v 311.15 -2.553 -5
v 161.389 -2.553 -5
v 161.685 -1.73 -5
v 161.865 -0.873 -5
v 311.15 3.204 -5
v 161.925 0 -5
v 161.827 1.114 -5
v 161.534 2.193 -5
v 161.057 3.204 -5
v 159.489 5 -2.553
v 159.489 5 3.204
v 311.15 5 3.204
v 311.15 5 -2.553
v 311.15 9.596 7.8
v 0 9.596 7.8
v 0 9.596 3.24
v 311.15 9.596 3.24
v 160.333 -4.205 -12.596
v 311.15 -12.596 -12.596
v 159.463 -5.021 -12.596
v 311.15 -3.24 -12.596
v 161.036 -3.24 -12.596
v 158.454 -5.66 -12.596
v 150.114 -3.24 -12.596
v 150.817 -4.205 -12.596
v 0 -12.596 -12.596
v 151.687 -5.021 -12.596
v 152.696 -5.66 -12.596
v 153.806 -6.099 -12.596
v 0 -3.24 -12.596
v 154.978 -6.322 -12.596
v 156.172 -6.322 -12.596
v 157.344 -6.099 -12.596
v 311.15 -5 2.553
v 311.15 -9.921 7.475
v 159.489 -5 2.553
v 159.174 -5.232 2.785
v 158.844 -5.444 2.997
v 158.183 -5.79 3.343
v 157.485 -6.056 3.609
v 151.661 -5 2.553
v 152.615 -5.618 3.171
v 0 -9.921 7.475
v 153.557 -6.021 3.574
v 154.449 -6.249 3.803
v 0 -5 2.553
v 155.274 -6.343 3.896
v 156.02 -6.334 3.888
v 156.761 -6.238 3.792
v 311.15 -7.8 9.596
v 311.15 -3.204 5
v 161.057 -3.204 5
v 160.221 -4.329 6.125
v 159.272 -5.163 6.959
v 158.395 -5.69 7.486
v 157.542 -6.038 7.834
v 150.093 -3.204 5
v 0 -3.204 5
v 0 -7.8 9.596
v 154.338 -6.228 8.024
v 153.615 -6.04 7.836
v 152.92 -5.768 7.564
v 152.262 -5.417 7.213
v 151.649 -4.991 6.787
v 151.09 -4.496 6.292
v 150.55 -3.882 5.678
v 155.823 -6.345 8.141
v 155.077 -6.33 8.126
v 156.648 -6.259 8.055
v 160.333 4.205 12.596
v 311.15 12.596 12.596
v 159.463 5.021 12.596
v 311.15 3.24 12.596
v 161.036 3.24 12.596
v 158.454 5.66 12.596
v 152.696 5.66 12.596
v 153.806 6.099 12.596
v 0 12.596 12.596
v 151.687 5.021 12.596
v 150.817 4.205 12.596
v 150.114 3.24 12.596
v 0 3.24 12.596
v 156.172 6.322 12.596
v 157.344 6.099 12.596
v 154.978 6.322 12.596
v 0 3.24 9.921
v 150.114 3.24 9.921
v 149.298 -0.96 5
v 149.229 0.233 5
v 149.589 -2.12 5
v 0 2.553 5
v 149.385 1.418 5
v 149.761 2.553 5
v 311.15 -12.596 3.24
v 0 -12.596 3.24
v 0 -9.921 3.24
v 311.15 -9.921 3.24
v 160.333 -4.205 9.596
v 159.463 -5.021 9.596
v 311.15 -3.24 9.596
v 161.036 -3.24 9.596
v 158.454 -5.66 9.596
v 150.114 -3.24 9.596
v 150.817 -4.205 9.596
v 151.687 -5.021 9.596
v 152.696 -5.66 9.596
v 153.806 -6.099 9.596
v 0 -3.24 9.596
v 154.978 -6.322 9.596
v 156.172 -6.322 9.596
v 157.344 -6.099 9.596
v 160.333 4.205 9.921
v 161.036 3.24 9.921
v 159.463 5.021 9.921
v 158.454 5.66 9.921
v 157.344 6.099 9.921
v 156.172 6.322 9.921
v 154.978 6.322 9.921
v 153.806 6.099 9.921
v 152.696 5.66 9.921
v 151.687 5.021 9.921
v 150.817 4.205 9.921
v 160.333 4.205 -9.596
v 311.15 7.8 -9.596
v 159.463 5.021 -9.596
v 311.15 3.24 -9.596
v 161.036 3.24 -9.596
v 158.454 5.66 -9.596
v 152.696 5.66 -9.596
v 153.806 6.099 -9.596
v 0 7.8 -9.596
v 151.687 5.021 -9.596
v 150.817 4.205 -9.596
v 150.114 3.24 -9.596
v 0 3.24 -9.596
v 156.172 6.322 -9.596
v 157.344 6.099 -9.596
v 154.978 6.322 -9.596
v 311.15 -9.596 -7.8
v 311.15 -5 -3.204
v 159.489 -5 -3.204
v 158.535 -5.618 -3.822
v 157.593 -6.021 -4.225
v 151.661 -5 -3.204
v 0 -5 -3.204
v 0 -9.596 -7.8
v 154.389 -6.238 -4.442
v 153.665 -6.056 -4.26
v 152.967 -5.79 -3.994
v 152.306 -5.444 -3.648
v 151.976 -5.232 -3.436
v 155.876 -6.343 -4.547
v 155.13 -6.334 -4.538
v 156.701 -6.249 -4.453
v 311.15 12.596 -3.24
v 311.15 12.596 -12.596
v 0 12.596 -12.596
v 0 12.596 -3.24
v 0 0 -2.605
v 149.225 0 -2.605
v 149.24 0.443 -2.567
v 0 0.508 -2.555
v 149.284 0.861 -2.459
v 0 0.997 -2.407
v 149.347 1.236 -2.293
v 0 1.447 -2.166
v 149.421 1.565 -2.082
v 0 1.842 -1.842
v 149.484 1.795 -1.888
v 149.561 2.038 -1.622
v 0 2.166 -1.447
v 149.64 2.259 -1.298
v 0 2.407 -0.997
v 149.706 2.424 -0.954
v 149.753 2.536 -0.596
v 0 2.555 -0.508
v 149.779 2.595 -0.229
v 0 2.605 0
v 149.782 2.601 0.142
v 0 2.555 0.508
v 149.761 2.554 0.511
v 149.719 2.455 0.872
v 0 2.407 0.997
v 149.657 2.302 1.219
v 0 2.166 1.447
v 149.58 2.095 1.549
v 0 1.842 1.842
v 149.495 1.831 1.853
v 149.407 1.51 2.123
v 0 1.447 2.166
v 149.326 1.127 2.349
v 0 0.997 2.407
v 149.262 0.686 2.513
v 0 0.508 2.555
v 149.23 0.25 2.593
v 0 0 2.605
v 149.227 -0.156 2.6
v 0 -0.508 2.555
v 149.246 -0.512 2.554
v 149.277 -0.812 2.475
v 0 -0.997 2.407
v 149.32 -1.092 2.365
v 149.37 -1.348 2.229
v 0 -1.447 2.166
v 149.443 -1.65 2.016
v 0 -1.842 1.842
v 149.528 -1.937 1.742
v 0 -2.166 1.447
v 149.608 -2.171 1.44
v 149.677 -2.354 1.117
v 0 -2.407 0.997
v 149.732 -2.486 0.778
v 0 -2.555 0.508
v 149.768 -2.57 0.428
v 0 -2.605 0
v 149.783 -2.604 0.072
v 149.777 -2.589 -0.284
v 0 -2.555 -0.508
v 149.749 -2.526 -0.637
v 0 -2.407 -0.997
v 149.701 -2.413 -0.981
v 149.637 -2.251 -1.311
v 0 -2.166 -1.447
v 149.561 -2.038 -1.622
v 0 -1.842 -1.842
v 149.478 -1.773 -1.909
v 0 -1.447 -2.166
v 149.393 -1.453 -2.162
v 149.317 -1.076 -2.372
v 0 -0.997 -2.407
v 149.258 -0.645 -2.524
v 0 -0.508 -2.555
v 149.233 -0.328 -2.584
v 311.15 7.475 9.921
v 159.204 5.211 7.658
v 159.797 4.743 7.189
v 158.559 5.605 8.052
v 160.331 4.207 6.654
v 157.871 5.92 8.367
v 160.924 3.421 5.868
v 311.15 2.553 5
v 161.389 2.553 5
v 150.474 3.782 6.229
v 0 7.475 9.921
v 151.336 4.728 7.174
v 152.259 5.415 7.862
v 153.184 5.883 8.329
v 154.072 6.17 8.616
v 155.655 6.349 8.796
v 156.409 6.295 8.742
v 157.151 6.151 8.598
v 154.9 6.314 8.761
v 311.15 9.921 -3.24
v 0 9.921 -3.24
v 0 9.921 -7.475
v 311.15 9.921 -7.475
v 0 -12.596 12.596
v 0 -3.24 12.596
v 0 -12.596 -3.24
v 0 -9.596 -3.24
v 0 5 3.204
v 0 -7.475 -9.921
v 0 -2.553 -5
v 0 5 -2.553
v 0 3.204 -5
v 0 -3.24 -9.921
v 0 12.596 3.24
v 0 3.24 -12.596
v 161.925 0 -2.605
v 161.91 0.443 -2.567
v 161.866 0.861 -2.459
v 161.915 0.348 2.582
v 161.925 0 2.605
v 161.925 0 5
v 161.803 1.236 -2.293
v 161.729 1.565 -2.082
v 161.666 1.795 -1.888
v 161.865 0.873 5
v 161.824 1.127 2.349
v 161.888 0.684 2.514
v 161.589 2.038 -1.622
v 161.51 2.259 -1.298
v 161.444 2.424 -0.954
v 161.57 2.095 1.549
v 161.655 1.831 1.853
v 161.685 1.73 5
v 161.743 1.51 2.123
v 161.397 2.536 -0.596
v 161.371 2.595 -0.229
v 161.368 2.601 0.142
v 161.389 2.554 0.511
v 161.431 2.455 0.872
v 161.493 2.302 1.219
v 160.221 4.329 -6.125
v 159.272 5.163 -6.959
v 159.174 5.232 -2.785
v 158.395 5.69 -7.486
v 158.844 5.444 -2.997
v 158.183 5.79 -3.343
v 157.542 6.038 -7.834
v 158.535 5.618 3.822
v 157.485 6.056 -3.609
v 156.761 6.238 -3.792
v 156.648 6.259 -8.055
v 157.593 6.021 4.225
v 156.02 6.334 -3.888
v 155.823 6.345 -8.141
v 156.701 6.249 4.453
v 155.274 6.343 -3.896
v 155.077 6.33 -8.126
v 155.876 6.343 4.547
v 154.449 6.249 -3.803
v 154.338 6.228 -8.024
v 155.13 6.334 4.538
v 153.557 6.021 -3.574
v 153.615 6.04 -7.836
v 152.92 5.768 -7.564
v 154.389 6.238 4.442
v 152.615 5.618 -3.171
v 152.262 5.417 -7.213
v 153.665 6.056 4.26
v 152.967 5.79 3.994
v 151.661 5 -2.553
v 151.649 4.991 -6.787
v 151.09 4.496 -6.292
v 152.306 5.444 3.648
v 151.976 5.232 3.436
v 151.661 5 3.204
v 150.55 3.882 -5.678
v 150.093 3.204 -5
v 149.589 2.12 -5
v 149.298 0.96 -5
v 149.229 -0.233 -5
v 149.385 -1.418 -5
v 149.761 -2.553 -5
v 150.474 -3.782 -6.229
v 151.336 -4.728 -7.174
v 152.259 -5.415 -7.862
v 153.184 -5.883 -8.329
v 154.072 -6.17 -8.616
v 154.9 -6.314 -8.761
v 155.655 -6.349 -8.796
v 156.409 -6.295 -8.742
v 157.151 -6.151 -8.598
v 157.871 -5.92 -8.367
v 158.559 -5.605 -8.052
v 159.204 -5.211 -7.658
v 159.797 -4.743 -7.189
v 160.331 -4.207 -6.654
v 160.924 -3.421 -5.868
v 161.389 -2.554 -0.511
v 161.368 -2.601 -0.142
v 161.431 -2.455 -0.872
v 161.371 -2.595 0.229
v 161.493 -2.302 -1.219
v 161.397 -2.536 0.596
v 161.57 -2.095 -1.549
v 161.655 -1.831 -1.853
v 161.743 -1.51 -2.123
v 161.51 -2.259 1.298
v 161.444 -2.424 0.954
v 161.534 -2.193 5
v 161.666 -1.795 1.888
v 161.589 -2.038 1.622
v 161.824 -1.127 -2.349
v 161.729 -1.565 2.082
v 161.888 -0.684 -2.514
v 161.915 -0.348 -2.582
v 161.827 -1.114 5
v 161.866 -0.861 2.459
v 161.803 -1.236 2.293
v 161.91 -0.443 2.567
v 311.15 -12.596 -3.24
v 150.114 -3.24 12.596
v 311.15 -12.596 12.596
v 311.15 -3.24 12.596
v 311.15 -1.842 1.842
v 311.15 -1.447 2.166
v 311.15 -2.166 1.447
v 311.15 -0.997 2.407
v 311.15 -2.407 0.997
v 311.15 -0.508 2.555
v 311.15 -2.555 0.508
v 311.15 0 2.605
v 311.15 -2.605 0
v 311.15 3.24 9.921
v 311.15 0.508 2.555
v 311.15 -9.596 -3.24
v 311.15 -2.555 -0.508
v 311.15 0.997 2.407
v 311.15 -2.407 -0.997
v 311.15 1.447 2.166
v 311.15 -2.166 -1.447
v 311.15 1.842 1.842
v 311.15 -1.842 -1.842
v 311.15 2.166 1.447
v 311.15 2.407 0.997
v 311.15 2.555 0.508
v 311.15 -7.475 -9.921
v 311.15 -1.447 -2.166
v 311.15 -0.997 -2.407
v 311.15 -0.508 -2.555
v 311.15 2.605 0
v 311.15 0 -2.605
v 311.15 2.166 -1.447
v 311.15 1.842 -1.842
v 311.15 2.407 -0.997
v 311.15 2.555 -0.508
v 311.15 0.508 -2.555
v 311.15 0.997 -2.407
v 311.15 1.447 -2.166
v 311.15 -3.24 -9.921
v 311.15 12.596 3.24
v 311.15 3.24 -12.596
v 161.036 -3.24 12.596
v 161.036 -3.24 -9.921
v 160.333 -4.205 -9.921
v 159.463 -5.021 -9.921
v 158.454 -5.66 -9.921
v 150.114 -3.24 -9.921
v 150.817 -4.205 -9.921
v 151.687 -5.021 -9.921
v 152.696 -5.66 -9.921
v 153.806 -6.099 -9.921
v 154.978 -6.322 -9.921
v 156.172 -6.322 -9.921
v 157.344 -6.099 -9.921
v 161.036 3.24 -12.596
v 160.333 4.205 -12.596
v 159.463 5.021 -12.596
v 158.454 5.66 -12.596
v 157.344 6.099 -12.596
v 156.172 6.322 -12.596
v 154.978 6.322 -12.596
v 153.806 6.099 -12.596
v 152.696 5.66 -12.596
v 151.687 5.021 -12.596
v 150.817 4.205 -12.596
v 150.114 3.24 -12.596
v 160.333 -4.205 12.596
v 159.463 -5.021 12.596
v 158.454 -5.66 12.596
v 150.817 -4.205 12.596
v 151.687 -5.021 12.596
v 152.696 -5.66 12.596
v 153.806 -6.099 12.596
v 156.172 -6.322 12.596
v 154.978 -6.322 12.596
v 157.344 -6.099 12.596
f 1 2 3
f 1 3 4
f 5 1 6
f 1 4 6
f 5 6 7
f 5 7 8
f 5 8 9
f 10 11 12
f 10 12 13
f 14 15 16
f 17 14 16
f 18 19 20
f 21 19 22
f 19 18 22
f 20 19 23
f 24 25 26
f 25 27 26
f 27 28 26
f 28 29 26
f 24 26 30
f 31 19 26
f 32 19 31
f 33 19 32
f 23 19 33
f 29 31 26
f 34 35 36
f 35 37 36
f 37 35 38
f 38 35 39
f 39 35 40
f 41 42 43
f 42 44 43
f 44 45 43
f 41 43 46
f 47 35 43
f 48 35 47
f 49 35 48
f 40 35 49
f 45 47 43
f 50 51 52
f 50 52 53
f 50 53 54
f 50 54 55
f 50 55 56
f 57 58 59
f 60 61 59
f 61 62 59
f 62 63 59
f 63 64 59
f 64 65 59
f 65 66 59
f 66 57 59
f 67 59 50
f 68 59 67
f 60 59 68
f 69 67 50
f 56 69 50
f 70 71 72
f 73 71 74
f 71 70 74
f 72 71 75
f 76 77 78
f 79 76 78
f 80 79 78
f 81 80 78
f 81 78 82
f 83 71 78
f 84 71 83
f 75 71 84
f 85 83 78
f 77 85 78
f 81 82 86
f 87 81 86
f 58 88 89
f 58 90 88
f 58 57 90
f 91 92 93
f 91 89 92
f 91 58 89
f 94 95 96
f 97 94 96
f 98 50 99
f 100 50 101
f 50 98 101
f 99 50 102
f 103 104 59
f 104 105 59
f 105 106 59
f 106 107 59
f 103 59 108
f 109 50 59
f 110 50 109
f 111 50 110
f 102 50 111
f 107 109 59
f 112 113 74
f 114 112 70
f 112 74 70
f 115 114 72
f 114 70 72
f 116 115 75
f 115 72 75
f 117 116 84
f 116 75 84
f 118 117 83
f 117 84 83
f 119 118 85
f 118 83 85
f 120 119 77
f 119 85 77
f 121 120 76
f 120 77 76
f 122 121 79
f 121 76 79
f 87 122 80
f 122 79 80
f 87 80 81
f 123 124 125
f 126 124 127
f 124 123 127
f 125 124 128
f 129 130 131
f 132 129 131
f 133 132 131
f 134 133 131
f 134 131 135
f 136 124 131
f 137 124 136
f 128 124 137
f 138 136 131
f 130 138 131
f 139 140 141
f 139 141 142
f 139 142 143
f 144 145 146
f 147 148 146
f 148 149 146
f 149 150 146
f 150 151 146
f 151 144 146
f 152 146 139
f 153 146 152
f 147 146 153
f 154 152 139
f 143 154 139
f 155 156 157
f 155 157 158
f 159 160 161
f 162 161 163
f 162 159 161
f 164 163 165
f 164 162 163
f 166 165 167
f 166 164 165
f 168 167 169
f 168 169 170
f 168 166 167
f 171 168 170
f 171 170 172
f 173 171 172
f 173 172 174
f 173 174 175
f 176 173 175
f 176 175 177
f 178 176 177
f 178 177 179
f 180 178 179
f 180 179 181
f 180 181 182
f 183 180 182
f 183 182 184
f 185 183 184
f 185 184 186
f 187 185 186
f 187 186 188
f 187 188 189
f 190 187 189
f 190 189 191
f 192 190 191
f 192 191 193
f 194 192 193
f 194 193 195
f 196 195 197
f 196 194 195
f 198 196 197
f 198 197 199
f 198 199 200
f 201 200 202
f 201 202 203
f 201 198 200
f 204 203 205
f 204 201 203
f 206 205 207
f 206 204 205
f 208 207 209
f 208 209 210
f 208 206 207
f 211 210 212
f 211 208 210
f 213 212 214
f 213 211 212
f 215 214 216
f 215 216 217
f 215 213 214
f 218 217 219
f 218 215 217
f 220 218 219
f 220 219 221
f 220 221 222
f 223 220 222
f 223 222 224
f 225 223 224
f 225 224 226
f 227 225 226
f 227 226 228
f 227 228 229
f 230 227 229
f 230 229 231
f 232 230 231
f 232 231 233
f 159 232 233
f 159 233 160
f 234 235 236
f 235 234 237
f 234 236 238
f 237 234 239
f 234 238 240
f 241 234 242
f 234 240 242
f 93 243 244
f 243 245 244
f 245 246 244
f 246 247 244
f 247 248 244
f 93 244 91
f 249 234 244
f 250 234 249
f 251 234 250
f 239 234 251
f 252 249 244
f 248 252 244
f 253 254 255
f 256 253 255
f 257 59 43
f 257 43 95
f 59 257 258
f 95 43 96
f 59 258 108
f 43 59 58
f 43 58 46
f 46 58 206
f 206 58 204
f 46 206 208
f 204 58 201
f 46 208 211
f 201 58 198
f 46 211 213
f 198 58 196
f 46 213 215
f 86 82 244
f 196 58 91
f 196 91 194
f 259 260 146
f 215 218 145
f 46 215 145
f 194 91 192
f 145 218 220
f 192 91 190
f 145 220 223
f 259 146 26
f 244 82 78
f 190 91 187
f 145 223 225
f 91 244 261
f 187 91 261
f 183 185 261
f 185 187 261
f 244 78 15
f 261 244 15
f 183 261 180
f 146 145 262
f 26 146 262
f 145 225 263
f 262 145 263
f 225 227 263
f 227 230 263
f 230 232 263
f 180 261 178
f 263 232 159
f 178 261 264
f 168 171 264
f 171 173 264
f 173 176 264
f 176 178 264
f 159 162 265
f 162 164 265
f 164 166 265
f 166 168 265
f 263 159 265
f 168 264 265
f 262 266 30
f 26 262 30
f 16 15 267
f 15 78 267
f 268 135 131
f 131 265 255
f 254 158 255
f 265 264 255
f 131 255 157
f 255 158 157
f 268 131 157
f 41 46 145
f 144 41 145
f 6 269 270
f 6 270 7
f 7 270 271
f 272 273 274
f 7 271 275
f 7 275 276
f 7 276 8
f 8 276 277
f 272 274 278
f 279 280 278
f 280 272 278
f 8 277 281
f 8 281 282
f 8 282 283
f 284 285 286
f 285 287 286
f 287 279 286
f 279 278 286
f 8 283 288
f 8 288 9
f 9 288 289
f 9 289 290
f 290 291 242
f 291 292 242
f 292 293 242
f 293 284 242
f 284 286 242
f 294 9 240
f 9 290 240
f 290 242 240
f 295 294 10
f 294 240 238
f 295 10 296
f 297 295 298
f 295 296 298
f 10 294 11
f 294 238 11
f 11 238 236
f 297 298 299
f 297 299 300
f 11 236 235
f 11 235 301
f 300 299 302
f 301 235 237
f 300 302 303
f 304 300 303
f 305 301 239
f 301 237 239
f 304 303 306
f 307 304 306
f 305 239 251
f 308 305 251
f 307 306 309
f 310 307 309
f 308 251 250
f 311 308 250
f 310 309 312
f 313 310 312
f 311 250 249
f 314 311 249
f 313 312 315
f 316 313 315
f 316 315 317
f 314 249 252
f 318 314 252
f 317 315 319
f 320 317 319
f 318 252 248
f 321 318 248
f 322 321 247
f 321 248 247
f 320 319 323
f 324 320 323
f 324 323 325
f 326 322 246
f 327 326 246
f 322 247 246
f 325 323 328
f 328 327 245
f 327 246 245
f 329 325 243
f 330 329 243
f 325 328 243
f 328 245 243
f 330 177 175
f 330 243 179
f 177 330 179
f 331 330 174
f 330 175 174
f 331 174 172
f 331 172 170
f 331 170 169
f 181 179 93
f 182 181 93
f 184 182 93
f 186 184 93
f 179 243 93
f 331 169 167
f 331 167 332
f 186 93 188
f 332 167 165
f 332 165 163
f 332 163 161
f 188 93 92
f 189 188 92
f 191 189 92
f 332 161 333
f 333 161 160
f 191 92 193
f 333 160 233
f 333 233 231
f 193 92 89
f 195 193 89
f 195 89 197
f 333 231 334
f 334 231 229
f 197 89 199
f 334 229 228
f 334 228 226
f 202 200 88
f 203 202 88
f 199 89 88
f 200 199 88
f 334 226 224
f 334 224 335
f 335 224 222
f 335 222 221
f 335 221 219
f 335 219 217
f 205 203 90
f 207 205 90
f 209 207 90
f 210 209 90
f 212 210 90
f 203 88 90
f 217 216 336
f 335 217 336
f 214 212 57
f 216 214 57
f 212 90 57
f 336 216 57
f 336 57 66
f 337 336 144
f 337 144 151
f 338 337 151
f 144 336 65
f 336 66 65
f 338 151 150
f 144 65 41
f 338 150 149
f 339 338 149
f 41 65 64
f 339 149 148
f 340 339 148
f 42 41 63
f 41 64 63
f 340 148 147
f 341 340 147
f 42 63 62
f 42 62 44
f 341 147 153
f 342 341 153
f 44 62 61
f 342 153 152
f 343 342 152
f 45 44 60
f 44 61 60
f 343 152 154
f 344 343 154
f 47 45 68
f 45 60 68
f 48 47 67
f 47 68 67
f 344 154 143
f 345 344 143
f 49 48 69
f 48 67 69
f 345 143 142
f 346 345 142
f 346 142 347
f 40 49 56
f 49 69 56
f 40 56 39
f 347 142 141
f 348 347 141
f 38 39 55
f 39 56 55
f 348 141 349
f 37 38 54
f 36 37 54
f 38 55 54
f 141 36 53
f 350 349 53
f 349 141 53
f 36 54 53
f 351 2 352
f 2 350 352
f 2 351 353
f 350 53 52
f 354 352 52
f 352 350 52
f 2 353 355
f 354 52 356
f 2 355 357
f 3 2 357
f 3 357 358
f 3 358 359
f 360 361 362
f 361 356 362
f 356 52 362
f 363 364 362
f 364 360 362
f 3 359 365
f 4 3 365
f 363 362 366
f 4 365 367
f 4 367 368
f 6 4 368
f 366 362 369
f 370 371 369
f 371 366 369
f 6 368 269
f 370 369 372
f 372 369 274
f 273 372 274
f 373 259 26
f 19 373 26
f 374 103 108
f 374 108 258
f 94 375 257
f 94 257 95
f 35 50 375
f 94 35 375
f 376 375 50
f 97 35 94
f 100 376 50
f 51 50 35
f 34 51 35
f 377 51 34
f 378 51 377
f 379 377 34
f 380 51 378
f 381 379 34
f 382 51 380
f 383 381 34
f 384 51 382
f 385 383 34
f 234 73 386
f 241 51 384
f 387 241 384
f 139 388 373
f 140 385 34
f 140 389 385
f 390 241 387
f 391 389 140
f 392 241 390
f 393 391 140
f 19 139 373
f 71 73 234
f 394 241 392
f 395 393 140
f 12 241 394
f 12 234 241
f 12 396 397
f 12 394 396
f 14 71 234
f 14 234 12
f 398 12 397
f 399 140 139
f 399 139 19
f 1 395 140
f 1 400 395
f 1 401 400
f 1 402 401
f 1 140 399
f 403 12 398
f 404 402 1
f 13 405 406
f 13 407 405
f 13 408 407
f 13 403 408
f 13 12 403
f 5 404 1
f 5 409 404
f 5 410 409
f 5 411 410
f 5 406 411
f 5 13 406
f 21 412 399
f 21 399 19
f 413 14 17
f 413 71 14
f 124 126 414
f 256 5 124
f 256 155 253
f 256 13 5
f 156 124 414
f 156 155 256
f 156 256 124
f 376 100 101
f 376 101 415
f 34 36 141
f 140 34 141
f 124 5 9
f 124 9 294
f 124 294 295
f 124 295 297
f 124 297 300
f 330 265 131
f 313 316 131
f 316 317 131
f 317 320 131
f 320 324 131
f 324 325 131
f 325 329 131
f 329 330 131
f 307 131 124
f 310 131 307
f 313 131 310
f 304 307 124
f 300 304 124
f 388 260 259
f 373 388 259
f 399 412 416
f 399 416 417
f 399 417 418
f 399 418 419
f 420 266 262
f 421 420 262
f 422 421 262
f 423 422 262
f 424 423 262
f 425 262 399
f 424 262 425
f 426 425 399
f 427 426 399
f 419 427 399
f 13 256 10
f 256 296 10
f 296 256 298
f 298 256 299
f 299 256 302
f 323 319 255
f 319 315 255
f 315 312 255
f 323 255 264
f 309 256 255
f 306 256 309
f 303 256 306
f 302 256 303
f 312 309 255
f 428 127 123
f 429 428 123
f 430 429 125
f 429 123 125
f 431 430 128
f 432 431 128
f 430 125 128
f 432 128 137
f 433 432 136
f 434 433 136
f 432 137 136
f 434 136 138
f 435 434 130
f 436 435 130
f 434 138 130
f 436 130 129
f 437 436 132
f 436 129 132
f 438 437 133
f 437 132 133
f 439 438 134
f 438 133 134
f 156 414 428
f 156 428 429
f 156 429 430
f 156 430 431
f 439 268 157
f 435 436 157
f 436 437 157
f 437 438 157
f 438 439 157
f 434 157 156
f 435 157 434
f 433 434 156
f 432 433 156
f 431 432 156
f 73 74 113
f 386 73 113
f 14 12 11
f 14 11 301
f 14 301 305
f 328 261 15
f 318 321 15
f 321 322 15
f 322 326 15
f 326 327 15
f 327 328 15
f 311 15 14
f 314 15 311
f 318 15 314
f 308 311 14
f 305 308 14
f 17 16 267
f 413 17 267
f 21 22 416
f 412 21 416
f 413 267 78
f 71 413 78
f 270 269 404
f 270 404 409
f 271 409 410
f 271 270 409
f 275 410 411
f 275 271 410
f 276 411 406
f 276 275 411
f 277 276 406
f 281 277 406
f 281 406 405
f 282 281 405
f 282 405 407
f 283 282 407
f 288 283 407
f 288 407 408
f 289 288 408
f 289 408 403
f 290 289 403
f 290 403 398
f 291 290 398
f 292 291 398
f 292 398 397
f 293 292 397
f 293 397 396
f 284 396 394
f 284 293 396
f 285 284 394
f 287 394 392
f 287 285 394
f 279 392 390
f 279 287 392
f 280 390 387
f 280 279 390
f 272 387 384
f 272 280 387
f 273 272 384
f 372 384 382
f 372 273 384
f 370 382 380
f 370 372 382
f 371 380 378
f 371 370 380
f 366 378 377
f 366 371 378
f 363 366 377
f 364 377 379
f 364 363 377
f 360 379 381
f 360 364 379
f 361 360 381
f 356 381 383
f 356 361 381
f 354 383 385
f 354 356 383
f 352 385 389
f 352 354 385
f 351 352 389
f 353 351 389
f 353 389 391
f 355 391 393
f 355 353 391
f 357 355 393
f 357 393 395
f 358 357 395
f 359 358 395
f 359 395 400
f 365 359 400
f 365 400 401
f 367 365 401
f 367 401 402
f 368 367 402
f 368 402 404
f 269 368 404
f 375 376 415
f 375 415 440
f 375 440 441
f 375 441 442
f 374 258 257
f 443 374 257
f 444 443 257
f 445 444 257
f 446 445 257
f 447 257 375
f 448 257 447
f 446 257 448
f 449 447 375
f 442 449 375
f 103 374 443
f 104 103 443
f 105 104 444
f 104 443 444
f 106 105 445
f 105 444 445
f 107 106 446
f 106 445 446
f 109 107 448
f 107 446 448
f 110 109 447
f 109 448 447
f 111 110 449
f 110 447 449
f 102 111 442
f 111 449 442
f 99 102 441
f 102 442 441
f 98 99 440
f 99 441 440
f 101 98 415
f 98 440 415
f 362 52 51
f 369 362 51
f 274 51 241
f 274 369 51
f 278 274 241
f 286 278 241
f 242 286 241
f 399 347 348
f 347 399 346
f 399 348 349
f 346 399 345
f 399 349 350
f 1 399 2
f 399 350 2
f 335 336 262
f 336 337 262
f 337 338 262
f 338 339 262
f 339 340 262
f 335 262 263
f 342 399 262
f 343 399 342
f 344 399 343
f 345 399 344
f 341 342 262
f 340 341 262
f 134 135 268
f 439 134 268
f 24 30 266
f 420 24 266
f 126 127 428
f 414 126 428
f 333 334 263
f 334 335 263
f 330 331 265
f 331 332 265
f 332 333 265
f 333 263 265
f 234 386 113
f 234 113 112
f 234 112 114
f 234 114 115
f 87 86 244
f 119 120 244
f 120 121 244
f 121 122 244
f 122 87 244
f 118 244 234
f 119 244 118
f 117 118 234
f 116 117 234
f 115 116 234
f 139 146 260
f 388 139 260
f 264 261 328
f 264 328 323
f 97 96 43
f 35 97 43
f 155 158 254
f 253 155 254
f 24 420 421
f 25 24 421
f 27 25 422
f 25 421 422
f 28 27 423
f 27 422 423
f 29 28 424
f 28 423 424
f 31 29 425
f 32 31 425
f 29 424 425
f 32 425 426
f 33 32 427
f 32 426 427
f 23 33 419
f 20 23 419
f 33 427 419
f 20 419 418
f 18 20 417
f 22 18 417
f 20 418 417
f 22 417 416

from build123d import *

# Parameters (mm, degrees)
SKETCH1_R           = 2.605
BOSS_EXTRUDE1_DEPTH = 311.15
CIRPATTERN1_COUNT   = 4
SKETCH2_R           = 6.35
CUT_EXTRUDE1_DEPTH  = 30


with BuildPart() as part:
    # Sketch1 → Boss-Extrude1 (new body)
    with BuildSketch(Plane(origin=(0, 0, 0), x_dir=(0, 0, -1), z_dir=(1, 0, 0))):
        Polygon((5, -5), (5, 3.203948776), (9.596194078, 7.800142853), (9.596194078, 3.24), (12.596194078, 3.24), (12.596194078, 12.596194078), (3.24, 12.596194078), (3.24, 9.921463197), (7.474873734, 9.921463197), (2.553410537, 5), (-5, 5), (-5, -5), align=None)
        Circle(SKETCH1_R, mode=Mode.SUBTRACT)
    boss_extrude1 = extrude(amount=BOSS_EXTRUDE1_DEPTH)

    # CirPattern1: Boss-Extrude1 ×4 about axis
    cirpattern1_axis = Axis((0, 0, 0), (1, 0, 0))
    for i in range(1, CIRPATTERN1_COUNT):
        add(boss_extrude1.rotate(cirpattern1_axis, i * 360 / CIRPATTERN1_COUNT))

    # Sketch2 → Cut-Extrude1 (cut)
    with BuildSketch(Plane.XY.offset(12.596194078)):
        with Locations((155.575, 0)):
            Circle(SKETCH2_R)
    extrude(amount=-CUT_EXTRUDE1_DEPTH, mode=Mode.SUBTRACT)


solid = part.part
